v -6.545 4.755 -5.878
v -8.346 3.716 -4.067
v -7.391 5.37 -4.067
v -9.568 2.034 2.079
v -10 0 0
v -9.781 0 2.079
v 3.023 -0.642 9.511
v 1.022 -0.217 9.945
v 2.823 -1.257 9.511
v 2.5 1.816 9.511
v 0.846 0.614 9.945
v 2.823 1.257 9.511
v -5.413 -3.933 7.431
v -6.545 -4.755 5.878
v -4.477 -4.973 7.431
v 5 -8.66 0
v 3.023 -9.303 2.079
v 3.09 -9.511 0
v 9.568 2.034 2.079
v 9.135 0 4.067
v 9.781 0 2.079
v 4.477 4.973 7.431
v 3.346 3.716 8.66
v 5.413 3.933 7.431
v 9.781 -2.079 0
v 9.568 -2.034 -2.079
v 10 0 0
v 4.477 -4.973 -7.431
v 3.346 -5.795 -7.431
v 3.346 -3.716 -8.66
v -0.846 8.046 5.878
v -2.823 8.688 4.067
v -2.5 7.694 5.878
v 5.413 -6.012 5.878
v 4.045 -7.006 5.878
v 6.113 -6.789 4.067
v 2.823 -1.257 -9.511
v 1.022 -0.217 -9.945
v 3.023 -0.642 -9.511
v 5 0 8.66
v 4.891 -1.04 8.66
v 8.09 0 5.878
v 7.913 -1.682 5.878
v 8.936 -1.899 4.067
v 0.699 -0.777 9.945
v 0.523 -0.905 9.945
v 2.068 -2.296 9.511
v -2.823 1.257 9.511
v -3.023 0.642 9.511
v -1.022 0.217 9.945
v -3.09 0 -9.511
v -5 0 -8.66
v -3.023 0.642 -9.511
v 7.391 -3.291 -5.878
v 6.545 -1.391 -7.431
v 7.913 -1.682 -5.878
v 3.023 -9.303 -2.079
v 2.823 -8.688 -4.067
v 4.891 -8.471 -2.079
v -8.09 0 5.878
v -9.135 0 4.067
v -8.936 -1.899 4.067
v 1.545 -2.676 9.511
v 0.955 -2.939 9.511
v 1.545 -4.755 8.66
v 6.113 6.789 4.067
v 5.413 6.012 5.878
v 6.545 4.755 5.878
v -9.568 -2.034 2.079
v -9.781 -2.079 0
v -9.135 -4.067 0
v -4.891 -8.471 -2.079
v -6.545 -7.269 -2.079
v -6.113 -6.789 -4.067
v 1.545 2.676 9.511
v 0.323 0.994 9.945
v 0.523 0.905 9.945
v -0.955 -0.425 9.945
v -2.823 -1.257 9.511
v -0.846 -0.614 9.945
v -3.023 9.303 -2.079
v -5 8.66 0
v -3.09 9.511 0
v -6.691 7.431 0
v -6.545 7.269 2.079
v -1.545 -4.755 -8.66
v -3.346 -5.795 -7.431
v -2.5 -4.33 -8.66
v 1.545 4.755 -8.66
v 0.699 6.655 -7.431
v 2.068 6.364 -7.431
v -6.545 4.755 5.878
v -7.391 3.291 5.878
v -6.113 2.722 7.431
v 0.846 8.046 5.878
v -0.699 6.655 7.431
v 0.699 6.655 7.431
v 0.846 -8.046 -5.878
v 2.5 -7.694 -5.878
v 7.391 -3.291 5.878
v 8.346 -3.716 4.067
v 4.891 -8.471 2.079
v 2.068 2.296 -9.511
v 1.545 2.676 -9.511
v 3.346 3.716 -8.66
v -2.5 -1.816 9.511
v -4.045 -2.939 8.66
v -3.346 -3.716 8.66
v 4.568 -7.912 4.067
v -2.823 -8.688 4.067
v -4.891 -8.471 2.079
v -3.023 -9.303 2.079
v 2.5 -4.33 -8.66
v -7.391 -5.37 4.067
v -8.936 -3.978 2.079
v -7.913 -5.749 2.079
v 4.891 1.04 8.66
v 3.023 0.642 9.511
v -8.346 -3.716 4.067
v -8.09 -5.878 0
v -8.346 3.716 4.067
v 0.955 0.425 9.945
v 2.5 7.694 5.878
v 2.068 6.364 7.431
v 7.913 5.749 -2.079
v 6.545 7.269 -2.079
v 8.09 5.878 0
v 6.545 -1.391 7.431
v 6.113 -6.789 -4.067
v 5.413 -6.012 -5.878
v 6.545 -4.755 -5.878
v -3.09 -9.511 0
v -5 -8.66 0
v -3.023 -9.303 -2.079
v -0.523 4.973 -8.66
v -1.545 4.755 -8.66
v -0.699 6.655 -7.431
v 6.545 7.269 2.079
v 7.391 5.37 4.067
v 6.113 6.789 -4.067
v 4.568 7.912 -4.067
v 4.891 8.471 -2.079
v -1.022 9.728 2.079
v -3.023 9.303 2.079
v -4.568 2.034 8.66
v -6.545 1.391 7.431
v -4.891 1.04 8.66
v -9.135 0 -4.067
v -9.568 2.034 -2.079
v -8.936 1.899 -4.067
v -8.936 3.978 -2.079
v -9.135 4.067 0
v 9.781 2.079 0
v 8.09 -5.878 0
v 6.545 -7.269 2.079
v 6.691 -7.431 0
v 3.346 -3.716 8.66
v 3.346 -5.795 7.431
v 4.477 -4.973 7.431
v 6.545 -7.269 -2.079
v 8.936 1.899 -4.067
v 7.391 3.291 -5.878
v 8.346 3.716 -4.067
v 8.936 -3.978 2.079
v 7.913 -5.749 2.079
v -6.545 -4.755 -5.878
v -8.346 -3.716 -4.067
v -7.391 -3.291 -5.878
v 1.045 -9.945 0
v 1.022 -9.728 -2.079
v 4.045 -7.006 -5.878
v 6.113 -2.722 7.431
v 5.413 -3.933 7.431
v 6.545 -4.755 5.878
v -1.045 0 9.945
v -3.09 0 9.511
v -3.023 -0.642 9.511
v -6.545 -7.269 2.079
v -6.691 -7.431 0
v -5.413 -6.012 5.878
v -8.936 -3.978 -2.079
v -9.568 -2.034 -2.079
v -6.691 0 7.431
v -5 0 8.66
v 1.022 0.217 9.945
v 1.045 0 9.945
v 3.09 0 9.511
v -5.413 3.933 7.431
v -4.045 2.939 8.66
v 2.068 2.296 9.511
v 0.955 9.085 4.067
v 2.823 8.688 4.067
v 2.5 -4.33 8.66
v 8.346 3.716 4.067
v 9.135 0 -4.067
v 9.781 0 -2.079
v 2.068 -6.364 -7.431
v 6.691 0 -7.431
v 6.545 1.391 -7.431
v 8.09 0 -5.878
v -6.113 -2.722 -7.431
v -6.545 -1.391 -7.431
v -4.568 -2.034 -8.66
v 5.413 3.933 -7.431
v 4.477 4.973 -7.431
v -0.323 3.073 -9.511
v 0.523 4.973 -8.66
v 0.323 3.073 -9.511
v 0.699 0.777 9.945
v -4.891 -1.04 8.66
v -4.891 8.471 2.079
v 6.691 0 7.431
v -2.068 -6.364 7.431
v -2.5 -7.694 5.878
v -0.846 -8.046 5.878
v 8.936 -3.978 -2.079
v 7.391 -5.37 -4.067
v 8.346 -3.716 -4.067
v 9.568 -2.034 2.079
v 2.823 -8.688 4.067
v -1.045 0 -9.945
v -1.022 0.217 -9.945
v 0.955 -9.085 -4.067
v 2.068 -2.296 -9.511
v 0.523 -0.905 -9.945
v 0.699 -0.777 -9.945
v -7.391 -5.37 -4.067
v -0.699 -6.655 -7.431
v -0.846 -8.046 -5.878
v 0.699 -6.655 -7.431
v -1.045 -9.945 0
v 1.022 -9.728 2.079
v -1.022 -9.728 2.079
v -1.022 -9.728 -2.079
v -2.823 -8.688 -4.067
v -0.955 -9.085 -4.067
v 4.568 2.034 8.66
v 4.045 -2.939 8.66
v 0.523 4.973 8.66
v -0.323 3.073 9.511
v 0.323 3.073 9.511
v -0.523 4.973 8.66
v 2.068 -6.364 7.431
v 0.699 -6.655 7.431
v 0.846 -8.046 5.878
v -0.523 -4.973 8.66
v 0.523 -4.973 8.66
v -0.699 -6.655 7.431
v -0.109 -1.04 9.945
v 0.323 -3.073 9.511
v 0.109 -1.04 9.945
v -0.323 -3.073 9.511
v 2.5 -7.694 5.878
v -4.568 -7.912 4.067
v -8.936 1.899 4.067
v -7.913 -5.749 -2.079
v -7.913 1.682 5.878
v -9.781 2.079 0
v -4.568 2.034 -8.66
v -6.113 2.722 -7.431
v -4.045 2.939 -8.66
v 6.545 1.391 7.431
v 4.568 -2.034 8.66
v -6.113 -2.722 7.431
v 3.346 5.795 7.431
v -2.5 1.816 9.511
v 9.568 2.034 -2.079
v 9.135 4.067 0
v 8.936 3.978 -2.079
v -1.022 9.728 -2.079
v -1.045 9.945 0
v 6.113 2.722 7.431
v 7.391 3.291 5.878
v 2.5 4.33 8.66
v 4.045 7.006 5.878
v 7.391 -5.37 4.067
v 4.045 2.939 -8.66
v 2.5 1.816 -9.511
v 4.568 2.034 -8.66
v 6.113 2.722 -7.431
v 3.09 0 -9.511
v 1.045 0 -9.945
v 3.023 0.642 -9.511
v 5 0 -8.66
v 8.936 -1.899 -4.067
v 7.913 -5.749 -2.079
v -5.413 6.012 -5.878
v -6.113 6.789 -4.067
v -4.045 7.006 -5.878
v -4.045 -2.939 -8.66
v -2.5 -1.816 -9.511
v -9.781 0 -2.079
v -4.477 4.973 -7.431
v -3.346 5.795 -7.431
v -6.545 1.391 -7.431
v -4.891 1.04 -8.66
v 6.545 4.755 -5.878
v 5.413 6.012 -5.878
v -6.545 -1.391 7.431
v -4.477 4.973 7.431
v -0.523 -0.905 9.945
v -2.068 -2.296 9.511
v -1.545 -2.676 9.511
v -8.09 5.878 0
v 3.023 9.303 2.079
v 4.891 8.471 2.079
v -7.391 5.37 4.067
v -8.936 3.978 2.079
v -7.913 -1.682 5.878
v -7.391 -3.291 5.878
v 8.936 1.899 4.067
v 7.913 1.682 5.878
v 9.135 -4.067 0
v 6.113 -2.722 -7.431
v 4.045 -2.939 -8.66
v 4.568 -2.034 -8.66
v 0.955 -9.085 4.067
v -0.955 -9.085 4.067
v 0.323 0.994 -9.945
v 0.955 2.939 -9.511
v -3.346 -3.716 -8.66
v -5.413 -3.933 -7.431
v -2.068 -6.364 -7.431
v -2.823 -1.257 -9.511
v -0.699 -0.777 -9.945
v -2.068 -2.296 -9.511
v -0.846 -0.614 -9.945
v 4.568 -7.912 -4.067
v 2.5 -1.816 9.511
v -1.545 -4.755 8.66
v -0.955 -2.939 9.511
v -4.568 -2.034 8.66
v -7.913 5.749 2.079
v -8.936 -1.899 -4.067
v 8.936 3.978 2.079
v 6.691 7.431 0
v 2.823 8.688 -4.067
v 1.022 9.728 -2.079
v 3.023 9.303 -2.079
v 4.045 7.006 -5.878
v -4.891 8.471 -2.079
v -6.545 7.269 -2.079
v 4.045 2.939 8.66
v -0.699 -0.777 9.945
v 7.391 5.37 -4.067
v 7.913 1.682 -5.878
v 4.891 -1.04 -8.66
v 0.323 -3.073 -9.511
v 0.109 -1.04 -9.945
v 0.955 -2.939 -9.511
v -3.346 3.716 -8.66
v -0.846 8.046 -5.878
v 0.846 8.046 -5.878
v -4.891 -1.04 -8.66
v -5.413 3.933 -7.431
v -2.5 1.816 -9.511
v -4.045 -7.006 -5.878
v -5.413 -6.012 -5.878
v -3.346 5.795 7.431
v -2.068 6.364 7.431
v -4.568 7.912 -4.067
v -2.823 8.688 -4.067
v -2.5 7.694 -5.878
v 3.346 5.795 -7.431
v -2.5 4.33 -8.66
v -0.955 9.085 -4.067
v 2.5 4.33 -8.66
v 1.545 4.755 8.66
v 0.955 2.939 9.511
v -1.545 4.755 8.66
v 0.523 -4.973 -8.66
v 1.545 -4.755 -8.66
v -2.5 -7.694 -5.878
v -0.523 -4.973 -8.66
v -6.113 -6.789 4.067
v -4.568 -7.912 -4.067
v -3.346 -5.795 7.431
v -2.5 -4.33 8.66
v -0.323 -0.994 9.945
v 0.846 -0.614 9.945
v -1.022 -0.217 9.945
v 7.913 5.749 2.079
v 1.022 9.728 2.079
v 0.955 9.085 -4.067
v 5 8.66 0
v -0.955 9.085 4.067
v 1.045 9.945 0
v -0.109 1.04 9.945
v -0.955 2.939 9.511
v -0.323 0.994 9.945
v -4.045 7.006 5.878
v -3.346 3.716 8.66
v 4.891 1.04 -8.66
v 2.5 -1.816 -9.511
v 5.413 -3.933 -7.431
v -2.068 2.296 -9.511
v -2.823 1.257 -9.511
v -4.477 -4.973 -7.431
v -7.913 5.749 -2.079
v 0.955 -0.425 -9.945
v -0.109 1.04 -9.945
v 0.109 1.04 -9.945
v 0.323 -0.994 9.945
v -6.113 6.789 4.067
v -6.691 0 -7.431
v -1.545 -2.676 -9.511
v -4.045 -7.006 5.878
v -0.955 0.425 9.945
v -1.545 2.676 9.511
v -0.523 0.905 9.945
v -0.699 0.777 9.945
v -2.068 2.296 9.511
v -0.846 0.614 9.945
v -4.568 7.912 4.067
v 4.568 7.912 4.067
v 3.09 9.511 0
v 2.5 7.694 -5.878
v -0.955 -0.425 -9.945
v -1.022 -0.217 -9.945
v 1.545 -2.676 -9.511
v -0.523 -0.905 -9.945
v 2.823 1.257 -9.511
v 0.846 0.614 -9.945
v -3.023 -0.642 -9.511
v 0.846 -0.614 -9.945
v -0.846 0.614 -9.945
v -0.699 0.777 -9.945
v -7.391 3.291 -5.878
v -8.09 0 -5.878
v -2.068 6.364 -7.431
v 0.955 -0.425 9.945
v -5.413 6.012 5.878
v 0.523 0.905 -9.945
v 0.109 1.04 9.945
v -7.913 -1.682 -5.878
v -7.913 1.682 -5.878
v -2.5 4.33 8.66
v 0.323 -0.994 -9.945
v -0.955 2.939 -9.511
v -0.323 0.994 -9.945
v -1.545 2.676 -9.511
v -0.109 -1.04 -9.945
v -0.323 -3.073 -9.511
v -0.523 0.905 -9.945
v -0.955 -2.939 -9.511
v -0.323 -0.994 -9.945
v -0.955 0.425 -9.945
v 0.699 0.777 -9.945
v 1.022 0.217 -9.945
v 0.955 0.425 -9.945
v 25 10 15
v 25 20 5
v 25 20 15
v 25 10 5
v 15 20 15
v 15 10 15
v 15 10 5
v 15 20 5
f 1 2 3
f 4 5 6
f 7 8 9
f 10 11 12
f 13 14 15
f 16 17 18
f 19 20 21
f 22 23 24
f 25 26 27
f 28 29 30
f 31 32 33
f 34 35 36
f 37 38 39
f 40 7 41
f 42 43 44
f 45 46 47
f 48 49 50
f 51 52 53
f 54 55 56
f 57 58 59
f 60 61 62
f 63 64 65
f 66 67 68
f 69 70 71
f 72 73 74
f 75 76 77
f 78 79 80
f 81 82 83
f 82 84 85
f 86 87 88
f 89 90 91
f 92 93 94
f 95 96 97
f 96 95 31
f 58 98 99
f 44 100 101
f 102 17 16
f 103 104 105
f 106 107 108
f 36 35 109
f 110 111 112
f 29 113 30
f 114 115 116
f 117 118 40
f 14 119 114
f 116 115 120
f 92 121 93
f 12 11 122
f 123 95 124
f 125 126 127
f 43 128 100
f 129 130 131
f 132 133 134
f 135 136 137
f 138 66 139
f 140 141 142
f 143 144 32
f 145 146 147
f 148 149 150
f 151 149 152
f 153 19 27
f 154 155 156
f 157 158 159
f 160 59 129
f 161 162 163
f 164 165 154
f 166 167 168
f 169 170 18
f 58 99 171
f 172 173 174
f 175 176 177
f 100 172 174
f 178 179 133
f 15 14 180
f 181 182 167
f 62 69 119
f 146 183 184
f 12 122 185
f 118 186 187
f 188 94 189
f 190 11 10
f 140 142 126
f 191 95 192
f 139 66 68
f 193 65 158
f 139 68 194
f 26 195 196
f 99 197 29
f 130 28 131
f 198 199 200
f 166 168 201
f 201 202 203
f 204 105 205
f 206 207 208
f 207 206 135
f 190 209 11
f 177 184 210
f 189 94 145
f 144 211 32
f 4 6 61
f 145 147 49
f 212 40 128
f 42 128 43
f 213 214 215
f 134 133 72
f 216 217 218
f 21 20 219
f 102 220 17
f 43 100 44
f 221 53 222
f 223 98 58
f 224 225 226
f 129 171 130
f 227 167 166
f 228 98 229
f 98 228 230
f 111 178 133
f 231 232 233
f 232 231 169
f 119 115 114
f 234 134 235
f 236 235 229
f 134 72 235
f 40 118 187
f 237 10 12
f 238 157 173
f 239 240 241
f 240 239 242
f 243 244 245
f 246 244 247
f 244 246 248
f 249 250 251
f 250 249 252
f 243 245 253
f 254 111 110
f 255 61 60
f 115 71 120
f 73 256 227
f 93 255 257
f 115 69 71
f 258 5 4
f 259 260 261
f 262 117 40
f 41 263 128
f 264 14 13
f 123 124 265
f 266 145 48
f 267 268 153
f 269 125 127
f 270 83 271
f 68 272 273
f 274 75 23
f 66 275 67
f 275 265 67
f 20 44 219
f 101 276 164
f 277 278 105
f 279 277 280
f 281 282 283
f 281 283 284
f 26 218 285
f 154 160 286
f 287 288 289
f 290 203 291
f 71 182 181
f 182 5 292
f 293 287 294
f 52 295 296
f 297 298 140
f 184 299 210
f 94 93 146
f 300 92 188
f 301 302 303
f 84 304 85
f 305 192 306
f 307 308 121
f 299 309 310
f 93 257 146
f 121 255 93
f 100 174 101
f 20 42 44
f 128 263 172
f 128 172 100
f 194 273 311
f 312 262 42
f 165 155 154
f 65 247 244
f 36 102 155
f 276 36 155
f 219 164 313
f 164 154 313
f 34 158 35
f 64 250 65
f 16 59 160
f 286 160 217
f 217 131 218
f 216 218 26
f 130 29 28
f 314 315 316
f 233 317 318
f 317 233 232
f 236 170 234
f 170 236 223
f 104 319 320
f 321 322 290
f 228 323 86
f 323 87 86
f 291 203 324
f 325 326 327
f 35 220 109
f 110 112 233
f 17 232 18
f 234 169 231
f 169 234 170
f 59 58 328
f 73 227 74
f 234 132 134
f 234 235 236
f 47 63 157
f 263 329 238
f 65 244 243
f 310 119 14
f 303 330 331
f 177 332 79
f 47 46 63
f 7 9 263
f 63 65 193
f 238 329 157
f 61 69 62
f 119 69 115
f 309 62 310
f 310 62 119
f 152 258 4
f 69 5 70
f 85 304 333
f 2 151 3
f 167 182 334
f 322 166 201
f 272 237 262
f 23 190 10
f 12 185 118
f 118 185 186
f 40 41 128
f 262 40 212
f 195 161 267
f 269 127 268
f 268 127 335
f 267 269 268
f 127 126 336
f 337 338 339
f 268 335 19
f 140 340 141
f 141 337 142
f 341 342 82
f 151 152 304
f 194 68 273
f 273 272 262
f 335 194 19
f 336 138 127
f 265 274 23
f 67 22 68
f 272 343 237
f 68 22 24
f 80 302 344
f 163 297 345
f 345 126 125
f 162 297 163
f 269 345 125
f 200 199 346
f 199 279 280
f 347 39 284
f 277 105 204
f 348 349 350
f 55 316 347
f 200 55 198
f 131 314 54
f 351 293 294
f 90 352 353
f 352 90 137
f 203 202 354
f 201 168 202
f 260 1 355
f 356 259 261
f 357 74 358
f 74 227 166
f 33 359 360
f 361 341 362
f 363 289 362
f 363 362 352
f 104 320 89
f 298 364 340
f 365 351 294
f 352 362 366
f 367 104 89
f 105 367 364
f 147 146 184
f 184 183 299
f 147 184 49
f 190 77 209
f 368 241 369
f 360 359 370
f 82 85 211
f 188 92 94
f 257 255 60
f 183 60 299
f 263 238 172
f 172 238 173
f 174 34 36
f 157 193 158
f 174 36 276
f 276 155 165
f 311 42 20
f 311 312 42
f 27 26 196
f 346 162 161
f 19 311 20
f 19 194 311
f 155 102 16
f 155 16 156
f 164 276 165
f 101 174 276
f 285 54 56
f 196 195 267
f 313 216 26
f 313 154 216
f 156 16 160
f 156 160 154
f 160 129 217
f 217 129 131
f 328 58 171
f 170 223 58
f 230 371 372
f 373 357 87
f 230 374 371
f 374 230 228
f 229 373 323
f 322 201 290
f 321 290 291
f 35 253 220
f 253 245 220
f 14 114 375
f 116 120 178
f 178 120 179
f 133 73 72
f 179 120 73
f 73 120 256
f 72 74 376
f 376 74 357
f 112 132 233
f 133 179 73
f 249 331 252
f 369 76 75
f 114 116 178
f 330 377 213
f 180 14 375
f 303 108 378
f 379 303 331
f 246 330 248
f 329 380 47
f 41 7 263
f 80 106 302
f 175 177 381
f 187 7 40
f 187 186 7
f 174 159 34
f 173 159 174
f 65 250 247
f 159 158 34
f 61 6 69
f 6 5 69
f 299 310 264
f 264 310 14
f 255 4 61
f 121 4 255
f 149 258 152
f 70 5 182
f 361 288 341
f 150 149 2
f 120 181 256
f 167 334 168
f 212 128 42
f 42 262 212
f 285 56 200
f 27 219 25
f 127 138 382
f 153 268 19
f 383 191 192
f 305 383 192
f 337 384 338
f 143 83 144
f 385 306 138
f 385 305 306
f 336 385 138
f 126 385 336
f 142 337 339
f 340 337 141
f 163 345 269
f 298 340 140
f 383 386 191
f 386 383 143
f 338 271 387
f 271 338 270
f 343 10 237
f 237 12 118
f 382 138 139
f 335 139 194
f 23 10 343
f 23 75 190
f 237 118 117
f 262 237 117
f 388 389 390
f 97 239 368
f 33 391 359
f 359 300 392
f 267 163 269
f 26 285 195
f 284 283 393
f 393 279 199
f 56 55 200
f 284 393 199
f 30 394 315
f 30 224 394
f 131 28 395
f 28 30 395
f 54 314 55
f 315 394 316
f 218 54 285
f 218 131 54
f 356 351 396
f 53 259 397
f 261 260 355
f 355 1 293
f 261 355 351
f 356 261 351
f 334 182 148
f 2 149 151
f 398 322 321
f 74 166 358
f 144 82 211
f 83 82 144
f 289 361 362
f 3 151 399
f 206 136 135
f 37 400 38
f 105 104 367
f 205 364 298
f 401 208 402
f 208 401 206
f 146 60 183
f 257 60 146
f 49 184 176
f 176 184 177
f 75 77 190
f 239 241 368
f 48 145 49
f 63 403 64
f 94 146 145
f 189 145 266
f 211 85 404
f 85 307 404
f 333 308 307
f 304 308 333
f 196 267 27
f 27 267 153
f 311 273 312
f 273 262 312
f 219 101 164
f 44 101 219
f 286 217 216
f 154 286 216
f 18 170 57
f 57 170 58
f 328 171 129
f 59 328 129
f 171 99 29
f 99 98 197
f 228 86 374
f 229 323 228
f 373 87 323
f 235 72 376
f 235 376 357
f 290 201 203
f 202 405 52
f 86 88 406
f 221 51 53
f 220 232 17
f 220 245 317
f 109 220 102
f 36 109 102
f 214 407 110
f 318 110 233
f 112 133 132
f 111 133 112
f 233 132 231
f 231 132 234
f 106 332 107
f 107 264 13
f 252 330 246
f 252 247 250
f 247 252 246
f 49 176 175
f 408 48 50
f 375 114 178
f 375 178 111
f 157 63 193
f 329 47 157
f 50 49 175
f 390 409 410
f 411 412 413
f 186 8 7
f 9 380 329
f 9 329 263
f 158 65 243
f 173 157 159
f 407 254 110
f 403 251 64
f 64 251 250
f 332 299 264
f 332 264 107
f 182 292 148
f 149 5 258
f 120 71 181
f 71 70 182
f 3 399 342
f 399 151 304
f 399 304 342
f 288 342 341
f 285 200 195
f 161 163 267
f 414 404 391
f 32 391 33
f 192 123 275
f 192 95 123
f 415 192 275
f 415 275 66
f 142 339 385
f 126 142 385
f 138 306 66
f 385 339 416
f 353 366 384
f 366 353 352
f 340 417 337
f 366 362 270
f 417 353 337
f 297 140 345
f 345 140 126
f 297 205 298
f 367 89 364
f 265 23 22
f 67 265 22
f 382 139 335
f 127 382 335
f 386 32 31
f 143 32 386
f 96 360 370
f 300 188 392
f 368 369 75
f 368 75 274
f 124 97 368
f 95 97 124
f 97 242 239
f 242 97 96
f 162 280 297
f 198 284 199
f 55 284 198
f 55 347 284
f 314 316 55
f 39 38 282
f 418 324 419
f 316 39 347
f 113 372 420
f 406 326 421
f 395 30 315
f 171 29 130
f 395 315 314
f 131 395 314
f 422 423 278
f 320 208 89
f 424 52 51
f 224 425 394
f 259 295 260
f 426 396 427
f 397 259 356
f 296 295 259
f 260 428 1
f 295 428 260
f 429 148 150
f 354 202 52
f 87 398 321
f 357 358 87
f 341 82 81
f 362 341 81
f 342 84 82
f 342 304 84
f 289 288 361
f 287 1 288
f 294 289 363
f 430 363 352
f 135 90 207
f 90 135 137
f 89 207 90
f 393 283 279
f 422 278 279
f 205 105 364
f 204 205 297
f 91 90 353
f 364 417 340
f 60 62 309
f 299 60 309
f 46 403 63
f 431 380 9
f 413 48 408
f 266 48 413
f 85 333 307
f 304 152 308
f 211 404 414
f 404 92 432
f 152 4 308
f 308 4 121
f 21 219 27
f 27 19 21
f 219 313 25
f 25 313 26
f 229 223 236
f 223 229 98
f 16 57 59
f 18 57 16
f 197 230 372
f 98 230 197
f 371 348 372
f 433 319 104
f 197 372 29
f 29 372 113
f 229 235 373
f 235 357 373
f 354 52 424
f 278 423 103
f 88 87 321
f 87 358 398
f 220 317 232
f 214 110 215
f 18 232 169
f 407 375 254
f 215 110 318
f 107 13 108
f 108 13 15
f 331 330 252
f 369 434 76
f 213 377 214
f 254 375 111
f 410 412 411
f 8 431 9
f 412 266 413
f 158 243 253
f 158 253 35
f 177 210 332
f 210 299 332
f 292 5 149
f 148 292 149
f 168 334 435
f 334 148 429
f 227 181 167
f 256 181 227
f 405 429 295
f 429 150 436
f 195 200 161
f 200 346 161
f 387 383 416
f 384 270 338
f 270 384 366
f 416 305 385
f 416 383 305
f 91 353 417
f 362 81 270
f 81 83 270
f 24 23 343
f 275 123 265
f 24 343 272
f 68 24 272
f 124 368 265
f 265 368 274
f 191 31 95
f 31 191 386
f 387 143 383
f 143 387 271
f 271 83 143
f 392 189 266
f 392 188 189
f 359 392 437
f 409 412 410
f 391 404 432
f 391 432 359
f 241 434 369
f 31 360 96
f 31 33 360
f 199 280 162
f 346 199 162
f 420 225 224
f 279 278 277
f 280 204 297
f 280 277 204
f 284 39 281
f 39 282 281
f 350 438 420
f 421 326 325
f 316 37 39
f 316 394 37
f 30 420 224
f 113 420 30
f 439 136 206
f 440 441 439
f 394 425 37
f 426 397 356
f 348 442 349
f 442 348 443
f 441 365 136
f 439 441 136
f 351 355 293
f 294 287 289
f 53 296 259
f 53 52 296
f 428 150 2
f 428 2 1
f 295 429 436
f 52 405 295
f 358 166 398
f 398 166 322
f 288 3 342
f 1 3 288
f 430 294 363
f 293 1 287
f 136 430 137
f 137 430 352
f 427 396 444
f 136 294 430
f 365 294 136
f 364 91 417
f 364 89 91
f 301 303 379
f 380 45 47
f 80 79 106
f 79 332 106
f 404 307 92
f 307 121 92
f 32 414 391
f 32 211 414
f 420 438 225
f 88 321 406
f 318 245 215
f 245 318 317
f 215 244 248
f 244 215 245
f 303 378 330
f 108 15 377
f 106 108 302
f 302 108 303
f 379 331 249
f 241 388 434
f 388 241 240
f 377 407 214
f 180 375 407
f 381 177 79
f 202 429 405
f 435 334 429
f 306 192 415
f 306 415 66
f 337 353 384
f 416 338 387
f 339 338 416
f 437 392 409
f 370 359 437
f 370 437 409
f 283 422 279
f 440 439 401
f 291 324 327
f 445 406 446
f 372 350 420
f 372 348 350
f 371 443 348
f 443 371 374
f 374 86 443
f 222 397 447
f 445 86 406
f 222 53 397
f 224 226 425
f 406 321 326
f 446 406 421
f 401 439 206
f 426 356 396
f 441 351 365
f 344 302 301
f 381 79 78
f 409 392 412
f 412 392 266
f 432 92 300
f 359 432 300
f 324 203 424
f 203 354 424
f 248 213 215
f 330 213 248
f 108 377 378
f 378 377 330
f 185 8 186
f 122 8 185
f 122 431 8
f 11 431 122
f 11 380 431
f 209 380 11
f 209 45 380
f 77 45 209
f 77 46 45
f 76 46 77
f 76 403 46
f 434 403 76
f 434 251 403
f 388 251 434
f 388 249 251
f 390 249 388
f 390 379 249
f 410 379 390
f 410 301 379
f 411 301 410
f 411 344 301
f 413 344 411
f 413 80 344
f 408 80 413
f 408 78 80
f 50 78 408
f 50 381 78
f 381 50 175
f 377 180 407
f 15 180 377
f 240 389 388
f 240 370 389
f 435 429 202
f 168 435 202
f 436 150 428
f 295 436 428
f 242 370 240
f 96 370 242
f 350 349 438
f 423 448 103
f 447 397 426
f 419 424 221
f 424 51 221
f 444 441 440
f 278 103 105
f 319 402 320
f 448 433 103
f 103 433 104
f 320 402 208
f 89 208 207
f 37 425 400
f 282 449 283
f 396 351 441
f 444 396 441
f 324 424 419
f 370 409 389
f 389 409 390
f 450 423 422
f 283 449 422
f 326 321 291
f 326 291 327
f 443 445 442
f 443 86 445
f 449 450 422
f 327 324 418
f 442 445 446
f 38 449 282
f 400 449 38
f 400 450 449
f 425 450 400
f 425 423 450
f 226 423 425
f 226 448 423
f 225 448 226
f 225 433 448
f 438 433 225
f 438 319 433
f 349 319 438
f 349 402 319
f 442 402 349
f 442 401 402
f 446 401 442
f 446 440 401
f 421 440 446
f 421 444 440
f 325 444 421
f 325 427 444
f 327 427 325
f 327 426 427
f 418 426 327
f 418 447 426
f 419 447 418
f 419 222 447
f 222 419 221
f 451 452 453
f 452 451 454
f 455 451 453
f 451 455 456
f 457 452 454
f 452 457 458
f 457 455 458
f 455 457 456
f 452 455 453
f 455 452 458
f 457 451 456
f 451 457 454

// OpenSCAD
// bounding box example usage
module model()
    color("red") 
    union() {
        sphere(10);
        translate([15,10,5]) cube(10);
    }

model();
%bbox() model();


module bbox() { 

    // a 3D approx. of the children projection on X axis 
    
    // https://en.wikibooks.org/wiki/OpenSCAD_User_Manual/Tips_and_Tricks
    
    module xProjection() 
        translate([0,1/2,-1/2]) 
            linear_extrude(1) 
                hull() 
                    projection() 
                        rotate([90,0,0]) 
                            linear_extrude(1) 
                                projection() children(); 
  
    // a bounding box with an offset of 1 in all axis
    module bbx()  
        minkowski() { 
            xProjection() children(); // x axis
            rotate(-90)               // y axis
                xProjection() rotate(90) children(); 
            rotate([0,-90,0])         // z axis
                xProjection() rotate([0,90,0]) children(); 
        } 
    
    // offset children() (a cube) by -1 in all axis
    module shrink()
      intersection() {
        translate([ 1, 1, 1]) children();
        translate([-1,-1,-1]) children();
      }

   shrink() bbx() children(); 
}
